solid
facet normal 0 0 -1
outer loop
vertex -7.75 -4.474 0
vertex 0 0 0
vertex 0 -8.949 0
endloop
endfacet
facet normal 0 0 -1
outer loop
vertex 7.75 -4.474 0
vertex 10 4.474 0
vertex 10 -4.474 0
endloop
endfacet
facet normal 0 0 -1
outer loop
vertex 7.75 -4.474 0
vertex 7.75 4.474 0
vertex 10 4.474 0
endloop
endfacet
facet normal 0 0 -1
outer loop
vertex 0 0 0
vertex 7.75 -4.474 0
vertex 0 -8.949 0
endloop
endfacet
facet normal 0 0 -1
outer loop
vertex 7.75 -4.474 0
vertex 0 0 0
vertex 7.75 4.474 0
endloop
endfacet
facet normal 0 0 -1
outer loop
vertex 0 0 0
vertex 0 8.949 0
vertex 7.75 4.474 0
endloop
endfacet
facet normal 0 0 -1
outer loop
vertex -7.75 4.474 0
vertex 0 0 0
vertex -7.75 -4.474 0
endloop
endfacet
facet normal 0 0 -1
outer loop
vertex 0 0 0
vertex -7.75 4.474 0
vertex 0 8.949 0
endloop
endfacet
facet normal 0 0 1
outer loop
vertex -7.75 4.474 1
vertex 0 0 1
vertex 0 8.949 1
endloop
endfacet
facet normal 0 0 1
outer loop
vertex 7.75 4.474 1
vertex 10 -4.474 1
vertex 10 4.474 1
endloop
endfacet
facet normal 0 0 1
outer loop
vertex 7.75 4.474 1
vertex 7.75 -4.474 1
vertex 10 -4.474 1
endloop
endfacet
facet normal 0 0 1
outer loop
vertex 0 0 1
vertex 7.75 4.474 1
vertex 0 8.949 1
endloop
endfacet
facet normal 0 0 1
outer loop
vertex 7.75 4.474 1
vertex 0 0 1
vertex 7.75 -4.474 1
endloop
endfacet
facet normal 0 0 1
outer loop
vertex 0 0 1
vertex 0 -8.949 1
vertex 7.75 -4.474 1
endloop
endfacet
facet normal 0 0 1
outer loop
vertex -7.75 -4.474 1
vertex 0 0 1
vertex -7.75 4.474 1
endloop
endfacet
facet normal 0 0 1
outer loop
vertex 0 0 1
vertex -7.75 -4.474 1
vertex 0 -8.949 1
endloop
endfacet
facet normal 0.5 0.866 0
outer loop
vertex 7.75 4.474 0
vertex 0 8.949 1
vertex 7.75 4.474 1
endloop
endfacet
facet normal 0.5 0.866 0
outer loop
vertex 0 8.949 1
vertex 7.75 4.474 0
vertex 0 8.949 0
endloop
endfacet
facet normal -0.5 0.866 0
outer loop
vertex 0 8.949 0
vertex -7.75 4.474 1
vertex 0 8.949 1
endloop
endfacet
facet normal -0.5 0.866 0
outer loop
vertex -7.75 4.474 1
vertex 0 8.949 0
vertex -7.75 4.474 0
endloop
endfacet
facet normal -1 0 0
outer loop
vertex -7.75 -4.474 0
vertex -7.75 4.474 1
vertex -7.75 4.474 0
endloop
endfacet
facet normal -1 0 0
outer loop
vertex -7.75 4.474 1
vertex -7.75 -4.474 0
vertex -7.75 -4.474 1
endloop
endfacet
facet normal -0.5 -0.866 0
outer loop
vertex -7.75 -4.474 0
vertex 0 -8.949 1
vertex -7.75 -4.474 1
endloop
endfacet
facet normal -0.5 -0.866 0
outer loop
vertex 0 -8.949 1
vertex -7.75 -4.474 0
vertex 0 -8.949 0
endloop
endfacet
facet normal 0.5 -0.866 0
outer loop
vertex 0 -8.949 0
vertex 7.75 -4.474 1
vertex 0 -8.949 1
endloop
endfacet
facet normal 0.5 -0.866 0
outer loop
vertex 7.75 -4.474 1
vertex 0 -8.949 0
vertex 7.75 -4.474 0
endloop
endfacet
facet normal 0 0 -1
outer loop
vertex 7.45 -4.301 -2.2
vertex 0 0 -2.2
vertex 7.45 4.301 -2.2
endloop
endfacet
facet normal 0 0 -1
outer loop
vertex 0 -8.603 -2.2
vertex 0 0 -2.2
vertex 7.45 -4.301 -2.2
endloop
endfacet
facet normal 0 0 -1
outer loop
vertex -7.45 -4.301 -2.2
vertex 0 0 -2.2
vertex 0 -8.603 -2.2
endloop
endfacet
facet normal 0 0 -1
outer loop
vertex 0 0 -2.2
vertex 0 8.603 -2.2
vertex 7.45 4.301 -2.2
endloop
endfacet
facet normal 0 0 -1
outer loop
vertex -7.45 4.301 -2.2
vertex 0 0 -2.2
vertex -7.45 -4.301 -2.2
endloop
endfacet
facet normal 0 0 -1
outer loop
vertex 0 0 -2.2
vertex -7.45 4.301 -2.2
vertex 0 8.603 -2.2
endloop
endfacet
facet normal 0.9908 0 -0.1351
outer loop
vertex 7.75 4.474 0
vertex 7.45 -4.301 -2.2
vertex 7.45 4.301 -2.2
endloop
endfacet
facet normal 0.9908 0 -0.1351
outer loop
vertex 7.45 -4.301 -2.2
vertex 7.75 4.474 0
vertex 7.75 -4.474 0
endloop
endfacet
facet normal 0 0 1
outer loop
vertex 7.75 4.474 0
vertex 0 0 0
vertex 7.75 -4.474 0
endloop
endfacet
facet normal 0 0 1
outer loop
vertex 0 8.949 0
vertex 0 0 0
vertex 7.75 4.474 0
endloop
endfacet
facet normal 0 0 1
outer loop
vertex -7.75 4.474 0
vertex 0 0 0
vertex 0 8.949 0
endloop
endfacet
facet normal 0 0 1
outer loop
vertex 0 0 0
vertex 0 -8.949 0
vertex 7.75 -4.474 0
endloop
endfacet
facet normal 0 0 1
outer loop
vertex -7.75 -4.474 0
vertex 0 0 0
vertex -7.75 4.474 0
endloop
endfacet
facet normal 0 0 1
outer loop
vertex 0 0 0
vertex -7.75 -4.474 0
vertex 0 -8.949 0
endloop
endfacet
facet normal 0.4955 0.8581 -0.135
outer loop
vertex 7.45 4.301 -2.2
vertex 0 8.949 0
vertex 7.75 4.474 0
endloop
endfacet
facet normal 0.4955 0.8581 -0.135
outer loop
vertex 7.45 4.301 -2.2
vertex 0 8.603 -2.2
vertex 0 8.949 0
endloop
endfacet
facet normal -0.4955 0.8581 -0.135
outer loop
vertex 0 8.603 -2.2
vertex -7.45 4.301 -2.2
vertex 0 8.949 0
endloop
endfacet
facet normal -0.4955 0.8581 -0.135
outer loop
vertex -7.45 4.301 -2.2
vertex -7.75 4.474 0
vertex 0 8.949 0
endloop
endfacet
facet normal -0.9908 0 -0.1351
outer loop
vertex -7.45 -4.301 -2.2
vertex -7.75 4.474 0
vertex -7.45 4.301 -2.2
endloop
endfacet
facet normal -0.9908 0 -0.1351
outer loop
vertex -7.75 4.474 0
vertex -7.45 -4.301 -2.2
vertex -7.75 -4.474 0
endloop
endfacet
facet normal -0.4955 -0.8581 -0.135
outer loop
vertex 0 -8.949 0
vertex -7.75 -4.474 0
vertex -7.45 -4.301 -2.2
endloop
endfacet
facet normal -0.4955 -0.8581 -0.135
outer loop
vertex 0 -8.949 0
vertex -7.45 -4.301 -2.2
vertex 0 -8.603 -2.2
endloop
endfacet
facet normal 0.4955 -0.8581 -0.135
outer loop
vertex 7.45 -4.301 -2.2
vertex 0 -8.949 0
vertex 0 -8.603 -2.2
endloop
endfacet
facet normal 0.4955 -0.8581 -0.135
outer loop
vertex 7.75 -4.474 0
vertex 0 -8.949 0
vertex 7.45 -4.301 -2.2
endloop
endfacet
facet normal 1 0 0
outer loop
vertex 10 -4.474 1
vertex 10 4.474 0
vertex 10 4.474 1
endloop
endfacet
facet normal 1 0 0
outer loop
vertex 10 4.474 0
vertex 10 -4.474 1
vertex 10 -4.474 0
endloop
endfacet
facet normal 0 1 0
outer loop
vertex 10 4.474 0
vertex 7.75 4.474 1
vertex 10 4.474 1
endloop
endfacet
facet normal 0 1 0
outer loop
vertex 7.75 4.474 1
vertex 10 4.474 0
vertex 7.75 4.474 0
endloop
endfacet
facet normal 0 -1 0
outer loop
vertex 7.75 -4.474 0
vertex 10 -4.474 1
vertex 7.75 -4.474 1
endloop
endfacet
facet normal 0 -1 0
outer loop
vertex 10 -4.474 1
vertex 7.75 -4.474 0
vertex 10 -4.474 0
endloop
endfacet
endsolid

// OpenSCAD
// file: ../Lib/HexGrid.scad
//Size of the hexagons, from one end to another
hexDiameter = 17.5;

//Height of the different pieces
hexHeight = 2.2;
hexMiddleHeight = 1.6;

//Thickness of a beam of the hex piece
beamThickness = 1;

//By how much should the polygon piece slope at the bottom layer?
hexPlay = 0.3;

//Generate a parenting node for the according hexagon
function hexNode(hexagon, height = hexHeight + hexMiddleHeight, rotation = 0) =
			//Translative coordinates
			[	[	hexDiameter * hexagon[0] + ((hexagon[1] % 2 != 0) ? hexDiameter/2 : 0),
					hexDiameter * sin(60) * hexagon[1],
					height],
			//Rotation coordinates
				[	0, 0, 60 * rotation] ];

module hexSegment(b2, t2, b1 = 0.0001, t1 = 0.0001, h) {
	fixDist = 0;

	render(convexity = 3)
	for(i=[0:5]) rotate([0, 0, i * 60])
	polyhedron(
		points = [	//Lower segments
					[b1, -tan(30) *b1, 0],	//0 - bottom left
					[b1,  tan(30) *b1, 0],	//1 - top left
					[b2,  tan(30) *b2, 0],	//2 - top right
					[b2, -tan(30) *b2, 0],	//3 - bottom right
					//Upper segments
					[t1, -tan(30 - fixDist) *t1, h],	//4 - bottom left
					[t1,  tan(30 - fixDist) *t1, h],	//5 - top left
					[t2,  tan(30 - fixDist) *t2, h],	//6 - top right
					[t2, -tan(30 - fixDist) *t2, h]],	//7 - bottom right
		faces = [
					[0, 3, 2, 1],	//Bottom face
					[4, 5, 6, 7],	//Top face
					[2, 3, 7, 6],	//Front face

					[0, 1, 5, 4],	//Back face

					[0, 4, 7, 3],	//Left face

					[1, 2, 6, 5]] );	//Right face
}

module lowerHex() {
	hexSegment(	hexDiameter /2 - beamThickness - hexPlay,
					hexDiameter /2 - beamThickness,
					hexDiameter /2 - beamThickness *2,
					hexDiameter /2 - beamThickness *2,
					hexHeight);
}

module lowerFill() {
	hexSegment(	 hexDiameter /2 - beamThickness - hexPlay,
					hexDiameter /2 - beamThickness,
					0.0001,
					0.0001,
					hexHeight);
}

module hexFill() {
	lowerFill();
}

module middleHex(aligned = true) {
	if(aligned)
		translate([0, 0, hexHeight]) middleHex(false);
	else
		hexSegment(	hexDiameter/2 - beamThickness,
						hexDiameter/2,
						hexDiameter/2 - beamThickness *2,
						hexDiameter/2 - beamThickness,
						hexMiddleHeight);
}

module upperHex(aligned = true) {
	if(aligned)
		translate([0, 0, hexHeight + hexMiddleHeight]) upperHex(false);
	else
		hexSegment(	hexDiameter/2,
						hexDiameter/2,
						hexDiameter/2 - beamThickness,
						hexDiameter/2 - beamThickness,
						hexHeight);
}

module hex() {
	lowerHex();
	middleHex();
	upperHex();
}

module hexPattern(i) {
	render() for(x=i) {
		if(x[1] % 2 != 0)
			translate([hexDiameter * x[0] + hexDiameter/2, x[1] * hexDiameter * sin(60)]) children();
		else
			translate([hexDiameter * x[0], x[1] * sin(60) * hexDiameter]) children();
	}
}
// main file
use <../Lib/HexGrid.scad>

plateThickness = 1;
extensionDistance = 10;

hexSegment(b2 = 17.5/2 - 1, t2 = 17.5/2 -1, h = plateThickness);
translate([0, 0, -2.2]) lowerFill();

module holderPlate() {
	plateWidth = tan(30) * (17.5/2 -1) * 2; 
	plateLength = extensionDistance;
	
	translate([0, - plateWidth/2, 0]) cube([plateLength, plateWidth, plateThickness]);
}

holderPlate();
